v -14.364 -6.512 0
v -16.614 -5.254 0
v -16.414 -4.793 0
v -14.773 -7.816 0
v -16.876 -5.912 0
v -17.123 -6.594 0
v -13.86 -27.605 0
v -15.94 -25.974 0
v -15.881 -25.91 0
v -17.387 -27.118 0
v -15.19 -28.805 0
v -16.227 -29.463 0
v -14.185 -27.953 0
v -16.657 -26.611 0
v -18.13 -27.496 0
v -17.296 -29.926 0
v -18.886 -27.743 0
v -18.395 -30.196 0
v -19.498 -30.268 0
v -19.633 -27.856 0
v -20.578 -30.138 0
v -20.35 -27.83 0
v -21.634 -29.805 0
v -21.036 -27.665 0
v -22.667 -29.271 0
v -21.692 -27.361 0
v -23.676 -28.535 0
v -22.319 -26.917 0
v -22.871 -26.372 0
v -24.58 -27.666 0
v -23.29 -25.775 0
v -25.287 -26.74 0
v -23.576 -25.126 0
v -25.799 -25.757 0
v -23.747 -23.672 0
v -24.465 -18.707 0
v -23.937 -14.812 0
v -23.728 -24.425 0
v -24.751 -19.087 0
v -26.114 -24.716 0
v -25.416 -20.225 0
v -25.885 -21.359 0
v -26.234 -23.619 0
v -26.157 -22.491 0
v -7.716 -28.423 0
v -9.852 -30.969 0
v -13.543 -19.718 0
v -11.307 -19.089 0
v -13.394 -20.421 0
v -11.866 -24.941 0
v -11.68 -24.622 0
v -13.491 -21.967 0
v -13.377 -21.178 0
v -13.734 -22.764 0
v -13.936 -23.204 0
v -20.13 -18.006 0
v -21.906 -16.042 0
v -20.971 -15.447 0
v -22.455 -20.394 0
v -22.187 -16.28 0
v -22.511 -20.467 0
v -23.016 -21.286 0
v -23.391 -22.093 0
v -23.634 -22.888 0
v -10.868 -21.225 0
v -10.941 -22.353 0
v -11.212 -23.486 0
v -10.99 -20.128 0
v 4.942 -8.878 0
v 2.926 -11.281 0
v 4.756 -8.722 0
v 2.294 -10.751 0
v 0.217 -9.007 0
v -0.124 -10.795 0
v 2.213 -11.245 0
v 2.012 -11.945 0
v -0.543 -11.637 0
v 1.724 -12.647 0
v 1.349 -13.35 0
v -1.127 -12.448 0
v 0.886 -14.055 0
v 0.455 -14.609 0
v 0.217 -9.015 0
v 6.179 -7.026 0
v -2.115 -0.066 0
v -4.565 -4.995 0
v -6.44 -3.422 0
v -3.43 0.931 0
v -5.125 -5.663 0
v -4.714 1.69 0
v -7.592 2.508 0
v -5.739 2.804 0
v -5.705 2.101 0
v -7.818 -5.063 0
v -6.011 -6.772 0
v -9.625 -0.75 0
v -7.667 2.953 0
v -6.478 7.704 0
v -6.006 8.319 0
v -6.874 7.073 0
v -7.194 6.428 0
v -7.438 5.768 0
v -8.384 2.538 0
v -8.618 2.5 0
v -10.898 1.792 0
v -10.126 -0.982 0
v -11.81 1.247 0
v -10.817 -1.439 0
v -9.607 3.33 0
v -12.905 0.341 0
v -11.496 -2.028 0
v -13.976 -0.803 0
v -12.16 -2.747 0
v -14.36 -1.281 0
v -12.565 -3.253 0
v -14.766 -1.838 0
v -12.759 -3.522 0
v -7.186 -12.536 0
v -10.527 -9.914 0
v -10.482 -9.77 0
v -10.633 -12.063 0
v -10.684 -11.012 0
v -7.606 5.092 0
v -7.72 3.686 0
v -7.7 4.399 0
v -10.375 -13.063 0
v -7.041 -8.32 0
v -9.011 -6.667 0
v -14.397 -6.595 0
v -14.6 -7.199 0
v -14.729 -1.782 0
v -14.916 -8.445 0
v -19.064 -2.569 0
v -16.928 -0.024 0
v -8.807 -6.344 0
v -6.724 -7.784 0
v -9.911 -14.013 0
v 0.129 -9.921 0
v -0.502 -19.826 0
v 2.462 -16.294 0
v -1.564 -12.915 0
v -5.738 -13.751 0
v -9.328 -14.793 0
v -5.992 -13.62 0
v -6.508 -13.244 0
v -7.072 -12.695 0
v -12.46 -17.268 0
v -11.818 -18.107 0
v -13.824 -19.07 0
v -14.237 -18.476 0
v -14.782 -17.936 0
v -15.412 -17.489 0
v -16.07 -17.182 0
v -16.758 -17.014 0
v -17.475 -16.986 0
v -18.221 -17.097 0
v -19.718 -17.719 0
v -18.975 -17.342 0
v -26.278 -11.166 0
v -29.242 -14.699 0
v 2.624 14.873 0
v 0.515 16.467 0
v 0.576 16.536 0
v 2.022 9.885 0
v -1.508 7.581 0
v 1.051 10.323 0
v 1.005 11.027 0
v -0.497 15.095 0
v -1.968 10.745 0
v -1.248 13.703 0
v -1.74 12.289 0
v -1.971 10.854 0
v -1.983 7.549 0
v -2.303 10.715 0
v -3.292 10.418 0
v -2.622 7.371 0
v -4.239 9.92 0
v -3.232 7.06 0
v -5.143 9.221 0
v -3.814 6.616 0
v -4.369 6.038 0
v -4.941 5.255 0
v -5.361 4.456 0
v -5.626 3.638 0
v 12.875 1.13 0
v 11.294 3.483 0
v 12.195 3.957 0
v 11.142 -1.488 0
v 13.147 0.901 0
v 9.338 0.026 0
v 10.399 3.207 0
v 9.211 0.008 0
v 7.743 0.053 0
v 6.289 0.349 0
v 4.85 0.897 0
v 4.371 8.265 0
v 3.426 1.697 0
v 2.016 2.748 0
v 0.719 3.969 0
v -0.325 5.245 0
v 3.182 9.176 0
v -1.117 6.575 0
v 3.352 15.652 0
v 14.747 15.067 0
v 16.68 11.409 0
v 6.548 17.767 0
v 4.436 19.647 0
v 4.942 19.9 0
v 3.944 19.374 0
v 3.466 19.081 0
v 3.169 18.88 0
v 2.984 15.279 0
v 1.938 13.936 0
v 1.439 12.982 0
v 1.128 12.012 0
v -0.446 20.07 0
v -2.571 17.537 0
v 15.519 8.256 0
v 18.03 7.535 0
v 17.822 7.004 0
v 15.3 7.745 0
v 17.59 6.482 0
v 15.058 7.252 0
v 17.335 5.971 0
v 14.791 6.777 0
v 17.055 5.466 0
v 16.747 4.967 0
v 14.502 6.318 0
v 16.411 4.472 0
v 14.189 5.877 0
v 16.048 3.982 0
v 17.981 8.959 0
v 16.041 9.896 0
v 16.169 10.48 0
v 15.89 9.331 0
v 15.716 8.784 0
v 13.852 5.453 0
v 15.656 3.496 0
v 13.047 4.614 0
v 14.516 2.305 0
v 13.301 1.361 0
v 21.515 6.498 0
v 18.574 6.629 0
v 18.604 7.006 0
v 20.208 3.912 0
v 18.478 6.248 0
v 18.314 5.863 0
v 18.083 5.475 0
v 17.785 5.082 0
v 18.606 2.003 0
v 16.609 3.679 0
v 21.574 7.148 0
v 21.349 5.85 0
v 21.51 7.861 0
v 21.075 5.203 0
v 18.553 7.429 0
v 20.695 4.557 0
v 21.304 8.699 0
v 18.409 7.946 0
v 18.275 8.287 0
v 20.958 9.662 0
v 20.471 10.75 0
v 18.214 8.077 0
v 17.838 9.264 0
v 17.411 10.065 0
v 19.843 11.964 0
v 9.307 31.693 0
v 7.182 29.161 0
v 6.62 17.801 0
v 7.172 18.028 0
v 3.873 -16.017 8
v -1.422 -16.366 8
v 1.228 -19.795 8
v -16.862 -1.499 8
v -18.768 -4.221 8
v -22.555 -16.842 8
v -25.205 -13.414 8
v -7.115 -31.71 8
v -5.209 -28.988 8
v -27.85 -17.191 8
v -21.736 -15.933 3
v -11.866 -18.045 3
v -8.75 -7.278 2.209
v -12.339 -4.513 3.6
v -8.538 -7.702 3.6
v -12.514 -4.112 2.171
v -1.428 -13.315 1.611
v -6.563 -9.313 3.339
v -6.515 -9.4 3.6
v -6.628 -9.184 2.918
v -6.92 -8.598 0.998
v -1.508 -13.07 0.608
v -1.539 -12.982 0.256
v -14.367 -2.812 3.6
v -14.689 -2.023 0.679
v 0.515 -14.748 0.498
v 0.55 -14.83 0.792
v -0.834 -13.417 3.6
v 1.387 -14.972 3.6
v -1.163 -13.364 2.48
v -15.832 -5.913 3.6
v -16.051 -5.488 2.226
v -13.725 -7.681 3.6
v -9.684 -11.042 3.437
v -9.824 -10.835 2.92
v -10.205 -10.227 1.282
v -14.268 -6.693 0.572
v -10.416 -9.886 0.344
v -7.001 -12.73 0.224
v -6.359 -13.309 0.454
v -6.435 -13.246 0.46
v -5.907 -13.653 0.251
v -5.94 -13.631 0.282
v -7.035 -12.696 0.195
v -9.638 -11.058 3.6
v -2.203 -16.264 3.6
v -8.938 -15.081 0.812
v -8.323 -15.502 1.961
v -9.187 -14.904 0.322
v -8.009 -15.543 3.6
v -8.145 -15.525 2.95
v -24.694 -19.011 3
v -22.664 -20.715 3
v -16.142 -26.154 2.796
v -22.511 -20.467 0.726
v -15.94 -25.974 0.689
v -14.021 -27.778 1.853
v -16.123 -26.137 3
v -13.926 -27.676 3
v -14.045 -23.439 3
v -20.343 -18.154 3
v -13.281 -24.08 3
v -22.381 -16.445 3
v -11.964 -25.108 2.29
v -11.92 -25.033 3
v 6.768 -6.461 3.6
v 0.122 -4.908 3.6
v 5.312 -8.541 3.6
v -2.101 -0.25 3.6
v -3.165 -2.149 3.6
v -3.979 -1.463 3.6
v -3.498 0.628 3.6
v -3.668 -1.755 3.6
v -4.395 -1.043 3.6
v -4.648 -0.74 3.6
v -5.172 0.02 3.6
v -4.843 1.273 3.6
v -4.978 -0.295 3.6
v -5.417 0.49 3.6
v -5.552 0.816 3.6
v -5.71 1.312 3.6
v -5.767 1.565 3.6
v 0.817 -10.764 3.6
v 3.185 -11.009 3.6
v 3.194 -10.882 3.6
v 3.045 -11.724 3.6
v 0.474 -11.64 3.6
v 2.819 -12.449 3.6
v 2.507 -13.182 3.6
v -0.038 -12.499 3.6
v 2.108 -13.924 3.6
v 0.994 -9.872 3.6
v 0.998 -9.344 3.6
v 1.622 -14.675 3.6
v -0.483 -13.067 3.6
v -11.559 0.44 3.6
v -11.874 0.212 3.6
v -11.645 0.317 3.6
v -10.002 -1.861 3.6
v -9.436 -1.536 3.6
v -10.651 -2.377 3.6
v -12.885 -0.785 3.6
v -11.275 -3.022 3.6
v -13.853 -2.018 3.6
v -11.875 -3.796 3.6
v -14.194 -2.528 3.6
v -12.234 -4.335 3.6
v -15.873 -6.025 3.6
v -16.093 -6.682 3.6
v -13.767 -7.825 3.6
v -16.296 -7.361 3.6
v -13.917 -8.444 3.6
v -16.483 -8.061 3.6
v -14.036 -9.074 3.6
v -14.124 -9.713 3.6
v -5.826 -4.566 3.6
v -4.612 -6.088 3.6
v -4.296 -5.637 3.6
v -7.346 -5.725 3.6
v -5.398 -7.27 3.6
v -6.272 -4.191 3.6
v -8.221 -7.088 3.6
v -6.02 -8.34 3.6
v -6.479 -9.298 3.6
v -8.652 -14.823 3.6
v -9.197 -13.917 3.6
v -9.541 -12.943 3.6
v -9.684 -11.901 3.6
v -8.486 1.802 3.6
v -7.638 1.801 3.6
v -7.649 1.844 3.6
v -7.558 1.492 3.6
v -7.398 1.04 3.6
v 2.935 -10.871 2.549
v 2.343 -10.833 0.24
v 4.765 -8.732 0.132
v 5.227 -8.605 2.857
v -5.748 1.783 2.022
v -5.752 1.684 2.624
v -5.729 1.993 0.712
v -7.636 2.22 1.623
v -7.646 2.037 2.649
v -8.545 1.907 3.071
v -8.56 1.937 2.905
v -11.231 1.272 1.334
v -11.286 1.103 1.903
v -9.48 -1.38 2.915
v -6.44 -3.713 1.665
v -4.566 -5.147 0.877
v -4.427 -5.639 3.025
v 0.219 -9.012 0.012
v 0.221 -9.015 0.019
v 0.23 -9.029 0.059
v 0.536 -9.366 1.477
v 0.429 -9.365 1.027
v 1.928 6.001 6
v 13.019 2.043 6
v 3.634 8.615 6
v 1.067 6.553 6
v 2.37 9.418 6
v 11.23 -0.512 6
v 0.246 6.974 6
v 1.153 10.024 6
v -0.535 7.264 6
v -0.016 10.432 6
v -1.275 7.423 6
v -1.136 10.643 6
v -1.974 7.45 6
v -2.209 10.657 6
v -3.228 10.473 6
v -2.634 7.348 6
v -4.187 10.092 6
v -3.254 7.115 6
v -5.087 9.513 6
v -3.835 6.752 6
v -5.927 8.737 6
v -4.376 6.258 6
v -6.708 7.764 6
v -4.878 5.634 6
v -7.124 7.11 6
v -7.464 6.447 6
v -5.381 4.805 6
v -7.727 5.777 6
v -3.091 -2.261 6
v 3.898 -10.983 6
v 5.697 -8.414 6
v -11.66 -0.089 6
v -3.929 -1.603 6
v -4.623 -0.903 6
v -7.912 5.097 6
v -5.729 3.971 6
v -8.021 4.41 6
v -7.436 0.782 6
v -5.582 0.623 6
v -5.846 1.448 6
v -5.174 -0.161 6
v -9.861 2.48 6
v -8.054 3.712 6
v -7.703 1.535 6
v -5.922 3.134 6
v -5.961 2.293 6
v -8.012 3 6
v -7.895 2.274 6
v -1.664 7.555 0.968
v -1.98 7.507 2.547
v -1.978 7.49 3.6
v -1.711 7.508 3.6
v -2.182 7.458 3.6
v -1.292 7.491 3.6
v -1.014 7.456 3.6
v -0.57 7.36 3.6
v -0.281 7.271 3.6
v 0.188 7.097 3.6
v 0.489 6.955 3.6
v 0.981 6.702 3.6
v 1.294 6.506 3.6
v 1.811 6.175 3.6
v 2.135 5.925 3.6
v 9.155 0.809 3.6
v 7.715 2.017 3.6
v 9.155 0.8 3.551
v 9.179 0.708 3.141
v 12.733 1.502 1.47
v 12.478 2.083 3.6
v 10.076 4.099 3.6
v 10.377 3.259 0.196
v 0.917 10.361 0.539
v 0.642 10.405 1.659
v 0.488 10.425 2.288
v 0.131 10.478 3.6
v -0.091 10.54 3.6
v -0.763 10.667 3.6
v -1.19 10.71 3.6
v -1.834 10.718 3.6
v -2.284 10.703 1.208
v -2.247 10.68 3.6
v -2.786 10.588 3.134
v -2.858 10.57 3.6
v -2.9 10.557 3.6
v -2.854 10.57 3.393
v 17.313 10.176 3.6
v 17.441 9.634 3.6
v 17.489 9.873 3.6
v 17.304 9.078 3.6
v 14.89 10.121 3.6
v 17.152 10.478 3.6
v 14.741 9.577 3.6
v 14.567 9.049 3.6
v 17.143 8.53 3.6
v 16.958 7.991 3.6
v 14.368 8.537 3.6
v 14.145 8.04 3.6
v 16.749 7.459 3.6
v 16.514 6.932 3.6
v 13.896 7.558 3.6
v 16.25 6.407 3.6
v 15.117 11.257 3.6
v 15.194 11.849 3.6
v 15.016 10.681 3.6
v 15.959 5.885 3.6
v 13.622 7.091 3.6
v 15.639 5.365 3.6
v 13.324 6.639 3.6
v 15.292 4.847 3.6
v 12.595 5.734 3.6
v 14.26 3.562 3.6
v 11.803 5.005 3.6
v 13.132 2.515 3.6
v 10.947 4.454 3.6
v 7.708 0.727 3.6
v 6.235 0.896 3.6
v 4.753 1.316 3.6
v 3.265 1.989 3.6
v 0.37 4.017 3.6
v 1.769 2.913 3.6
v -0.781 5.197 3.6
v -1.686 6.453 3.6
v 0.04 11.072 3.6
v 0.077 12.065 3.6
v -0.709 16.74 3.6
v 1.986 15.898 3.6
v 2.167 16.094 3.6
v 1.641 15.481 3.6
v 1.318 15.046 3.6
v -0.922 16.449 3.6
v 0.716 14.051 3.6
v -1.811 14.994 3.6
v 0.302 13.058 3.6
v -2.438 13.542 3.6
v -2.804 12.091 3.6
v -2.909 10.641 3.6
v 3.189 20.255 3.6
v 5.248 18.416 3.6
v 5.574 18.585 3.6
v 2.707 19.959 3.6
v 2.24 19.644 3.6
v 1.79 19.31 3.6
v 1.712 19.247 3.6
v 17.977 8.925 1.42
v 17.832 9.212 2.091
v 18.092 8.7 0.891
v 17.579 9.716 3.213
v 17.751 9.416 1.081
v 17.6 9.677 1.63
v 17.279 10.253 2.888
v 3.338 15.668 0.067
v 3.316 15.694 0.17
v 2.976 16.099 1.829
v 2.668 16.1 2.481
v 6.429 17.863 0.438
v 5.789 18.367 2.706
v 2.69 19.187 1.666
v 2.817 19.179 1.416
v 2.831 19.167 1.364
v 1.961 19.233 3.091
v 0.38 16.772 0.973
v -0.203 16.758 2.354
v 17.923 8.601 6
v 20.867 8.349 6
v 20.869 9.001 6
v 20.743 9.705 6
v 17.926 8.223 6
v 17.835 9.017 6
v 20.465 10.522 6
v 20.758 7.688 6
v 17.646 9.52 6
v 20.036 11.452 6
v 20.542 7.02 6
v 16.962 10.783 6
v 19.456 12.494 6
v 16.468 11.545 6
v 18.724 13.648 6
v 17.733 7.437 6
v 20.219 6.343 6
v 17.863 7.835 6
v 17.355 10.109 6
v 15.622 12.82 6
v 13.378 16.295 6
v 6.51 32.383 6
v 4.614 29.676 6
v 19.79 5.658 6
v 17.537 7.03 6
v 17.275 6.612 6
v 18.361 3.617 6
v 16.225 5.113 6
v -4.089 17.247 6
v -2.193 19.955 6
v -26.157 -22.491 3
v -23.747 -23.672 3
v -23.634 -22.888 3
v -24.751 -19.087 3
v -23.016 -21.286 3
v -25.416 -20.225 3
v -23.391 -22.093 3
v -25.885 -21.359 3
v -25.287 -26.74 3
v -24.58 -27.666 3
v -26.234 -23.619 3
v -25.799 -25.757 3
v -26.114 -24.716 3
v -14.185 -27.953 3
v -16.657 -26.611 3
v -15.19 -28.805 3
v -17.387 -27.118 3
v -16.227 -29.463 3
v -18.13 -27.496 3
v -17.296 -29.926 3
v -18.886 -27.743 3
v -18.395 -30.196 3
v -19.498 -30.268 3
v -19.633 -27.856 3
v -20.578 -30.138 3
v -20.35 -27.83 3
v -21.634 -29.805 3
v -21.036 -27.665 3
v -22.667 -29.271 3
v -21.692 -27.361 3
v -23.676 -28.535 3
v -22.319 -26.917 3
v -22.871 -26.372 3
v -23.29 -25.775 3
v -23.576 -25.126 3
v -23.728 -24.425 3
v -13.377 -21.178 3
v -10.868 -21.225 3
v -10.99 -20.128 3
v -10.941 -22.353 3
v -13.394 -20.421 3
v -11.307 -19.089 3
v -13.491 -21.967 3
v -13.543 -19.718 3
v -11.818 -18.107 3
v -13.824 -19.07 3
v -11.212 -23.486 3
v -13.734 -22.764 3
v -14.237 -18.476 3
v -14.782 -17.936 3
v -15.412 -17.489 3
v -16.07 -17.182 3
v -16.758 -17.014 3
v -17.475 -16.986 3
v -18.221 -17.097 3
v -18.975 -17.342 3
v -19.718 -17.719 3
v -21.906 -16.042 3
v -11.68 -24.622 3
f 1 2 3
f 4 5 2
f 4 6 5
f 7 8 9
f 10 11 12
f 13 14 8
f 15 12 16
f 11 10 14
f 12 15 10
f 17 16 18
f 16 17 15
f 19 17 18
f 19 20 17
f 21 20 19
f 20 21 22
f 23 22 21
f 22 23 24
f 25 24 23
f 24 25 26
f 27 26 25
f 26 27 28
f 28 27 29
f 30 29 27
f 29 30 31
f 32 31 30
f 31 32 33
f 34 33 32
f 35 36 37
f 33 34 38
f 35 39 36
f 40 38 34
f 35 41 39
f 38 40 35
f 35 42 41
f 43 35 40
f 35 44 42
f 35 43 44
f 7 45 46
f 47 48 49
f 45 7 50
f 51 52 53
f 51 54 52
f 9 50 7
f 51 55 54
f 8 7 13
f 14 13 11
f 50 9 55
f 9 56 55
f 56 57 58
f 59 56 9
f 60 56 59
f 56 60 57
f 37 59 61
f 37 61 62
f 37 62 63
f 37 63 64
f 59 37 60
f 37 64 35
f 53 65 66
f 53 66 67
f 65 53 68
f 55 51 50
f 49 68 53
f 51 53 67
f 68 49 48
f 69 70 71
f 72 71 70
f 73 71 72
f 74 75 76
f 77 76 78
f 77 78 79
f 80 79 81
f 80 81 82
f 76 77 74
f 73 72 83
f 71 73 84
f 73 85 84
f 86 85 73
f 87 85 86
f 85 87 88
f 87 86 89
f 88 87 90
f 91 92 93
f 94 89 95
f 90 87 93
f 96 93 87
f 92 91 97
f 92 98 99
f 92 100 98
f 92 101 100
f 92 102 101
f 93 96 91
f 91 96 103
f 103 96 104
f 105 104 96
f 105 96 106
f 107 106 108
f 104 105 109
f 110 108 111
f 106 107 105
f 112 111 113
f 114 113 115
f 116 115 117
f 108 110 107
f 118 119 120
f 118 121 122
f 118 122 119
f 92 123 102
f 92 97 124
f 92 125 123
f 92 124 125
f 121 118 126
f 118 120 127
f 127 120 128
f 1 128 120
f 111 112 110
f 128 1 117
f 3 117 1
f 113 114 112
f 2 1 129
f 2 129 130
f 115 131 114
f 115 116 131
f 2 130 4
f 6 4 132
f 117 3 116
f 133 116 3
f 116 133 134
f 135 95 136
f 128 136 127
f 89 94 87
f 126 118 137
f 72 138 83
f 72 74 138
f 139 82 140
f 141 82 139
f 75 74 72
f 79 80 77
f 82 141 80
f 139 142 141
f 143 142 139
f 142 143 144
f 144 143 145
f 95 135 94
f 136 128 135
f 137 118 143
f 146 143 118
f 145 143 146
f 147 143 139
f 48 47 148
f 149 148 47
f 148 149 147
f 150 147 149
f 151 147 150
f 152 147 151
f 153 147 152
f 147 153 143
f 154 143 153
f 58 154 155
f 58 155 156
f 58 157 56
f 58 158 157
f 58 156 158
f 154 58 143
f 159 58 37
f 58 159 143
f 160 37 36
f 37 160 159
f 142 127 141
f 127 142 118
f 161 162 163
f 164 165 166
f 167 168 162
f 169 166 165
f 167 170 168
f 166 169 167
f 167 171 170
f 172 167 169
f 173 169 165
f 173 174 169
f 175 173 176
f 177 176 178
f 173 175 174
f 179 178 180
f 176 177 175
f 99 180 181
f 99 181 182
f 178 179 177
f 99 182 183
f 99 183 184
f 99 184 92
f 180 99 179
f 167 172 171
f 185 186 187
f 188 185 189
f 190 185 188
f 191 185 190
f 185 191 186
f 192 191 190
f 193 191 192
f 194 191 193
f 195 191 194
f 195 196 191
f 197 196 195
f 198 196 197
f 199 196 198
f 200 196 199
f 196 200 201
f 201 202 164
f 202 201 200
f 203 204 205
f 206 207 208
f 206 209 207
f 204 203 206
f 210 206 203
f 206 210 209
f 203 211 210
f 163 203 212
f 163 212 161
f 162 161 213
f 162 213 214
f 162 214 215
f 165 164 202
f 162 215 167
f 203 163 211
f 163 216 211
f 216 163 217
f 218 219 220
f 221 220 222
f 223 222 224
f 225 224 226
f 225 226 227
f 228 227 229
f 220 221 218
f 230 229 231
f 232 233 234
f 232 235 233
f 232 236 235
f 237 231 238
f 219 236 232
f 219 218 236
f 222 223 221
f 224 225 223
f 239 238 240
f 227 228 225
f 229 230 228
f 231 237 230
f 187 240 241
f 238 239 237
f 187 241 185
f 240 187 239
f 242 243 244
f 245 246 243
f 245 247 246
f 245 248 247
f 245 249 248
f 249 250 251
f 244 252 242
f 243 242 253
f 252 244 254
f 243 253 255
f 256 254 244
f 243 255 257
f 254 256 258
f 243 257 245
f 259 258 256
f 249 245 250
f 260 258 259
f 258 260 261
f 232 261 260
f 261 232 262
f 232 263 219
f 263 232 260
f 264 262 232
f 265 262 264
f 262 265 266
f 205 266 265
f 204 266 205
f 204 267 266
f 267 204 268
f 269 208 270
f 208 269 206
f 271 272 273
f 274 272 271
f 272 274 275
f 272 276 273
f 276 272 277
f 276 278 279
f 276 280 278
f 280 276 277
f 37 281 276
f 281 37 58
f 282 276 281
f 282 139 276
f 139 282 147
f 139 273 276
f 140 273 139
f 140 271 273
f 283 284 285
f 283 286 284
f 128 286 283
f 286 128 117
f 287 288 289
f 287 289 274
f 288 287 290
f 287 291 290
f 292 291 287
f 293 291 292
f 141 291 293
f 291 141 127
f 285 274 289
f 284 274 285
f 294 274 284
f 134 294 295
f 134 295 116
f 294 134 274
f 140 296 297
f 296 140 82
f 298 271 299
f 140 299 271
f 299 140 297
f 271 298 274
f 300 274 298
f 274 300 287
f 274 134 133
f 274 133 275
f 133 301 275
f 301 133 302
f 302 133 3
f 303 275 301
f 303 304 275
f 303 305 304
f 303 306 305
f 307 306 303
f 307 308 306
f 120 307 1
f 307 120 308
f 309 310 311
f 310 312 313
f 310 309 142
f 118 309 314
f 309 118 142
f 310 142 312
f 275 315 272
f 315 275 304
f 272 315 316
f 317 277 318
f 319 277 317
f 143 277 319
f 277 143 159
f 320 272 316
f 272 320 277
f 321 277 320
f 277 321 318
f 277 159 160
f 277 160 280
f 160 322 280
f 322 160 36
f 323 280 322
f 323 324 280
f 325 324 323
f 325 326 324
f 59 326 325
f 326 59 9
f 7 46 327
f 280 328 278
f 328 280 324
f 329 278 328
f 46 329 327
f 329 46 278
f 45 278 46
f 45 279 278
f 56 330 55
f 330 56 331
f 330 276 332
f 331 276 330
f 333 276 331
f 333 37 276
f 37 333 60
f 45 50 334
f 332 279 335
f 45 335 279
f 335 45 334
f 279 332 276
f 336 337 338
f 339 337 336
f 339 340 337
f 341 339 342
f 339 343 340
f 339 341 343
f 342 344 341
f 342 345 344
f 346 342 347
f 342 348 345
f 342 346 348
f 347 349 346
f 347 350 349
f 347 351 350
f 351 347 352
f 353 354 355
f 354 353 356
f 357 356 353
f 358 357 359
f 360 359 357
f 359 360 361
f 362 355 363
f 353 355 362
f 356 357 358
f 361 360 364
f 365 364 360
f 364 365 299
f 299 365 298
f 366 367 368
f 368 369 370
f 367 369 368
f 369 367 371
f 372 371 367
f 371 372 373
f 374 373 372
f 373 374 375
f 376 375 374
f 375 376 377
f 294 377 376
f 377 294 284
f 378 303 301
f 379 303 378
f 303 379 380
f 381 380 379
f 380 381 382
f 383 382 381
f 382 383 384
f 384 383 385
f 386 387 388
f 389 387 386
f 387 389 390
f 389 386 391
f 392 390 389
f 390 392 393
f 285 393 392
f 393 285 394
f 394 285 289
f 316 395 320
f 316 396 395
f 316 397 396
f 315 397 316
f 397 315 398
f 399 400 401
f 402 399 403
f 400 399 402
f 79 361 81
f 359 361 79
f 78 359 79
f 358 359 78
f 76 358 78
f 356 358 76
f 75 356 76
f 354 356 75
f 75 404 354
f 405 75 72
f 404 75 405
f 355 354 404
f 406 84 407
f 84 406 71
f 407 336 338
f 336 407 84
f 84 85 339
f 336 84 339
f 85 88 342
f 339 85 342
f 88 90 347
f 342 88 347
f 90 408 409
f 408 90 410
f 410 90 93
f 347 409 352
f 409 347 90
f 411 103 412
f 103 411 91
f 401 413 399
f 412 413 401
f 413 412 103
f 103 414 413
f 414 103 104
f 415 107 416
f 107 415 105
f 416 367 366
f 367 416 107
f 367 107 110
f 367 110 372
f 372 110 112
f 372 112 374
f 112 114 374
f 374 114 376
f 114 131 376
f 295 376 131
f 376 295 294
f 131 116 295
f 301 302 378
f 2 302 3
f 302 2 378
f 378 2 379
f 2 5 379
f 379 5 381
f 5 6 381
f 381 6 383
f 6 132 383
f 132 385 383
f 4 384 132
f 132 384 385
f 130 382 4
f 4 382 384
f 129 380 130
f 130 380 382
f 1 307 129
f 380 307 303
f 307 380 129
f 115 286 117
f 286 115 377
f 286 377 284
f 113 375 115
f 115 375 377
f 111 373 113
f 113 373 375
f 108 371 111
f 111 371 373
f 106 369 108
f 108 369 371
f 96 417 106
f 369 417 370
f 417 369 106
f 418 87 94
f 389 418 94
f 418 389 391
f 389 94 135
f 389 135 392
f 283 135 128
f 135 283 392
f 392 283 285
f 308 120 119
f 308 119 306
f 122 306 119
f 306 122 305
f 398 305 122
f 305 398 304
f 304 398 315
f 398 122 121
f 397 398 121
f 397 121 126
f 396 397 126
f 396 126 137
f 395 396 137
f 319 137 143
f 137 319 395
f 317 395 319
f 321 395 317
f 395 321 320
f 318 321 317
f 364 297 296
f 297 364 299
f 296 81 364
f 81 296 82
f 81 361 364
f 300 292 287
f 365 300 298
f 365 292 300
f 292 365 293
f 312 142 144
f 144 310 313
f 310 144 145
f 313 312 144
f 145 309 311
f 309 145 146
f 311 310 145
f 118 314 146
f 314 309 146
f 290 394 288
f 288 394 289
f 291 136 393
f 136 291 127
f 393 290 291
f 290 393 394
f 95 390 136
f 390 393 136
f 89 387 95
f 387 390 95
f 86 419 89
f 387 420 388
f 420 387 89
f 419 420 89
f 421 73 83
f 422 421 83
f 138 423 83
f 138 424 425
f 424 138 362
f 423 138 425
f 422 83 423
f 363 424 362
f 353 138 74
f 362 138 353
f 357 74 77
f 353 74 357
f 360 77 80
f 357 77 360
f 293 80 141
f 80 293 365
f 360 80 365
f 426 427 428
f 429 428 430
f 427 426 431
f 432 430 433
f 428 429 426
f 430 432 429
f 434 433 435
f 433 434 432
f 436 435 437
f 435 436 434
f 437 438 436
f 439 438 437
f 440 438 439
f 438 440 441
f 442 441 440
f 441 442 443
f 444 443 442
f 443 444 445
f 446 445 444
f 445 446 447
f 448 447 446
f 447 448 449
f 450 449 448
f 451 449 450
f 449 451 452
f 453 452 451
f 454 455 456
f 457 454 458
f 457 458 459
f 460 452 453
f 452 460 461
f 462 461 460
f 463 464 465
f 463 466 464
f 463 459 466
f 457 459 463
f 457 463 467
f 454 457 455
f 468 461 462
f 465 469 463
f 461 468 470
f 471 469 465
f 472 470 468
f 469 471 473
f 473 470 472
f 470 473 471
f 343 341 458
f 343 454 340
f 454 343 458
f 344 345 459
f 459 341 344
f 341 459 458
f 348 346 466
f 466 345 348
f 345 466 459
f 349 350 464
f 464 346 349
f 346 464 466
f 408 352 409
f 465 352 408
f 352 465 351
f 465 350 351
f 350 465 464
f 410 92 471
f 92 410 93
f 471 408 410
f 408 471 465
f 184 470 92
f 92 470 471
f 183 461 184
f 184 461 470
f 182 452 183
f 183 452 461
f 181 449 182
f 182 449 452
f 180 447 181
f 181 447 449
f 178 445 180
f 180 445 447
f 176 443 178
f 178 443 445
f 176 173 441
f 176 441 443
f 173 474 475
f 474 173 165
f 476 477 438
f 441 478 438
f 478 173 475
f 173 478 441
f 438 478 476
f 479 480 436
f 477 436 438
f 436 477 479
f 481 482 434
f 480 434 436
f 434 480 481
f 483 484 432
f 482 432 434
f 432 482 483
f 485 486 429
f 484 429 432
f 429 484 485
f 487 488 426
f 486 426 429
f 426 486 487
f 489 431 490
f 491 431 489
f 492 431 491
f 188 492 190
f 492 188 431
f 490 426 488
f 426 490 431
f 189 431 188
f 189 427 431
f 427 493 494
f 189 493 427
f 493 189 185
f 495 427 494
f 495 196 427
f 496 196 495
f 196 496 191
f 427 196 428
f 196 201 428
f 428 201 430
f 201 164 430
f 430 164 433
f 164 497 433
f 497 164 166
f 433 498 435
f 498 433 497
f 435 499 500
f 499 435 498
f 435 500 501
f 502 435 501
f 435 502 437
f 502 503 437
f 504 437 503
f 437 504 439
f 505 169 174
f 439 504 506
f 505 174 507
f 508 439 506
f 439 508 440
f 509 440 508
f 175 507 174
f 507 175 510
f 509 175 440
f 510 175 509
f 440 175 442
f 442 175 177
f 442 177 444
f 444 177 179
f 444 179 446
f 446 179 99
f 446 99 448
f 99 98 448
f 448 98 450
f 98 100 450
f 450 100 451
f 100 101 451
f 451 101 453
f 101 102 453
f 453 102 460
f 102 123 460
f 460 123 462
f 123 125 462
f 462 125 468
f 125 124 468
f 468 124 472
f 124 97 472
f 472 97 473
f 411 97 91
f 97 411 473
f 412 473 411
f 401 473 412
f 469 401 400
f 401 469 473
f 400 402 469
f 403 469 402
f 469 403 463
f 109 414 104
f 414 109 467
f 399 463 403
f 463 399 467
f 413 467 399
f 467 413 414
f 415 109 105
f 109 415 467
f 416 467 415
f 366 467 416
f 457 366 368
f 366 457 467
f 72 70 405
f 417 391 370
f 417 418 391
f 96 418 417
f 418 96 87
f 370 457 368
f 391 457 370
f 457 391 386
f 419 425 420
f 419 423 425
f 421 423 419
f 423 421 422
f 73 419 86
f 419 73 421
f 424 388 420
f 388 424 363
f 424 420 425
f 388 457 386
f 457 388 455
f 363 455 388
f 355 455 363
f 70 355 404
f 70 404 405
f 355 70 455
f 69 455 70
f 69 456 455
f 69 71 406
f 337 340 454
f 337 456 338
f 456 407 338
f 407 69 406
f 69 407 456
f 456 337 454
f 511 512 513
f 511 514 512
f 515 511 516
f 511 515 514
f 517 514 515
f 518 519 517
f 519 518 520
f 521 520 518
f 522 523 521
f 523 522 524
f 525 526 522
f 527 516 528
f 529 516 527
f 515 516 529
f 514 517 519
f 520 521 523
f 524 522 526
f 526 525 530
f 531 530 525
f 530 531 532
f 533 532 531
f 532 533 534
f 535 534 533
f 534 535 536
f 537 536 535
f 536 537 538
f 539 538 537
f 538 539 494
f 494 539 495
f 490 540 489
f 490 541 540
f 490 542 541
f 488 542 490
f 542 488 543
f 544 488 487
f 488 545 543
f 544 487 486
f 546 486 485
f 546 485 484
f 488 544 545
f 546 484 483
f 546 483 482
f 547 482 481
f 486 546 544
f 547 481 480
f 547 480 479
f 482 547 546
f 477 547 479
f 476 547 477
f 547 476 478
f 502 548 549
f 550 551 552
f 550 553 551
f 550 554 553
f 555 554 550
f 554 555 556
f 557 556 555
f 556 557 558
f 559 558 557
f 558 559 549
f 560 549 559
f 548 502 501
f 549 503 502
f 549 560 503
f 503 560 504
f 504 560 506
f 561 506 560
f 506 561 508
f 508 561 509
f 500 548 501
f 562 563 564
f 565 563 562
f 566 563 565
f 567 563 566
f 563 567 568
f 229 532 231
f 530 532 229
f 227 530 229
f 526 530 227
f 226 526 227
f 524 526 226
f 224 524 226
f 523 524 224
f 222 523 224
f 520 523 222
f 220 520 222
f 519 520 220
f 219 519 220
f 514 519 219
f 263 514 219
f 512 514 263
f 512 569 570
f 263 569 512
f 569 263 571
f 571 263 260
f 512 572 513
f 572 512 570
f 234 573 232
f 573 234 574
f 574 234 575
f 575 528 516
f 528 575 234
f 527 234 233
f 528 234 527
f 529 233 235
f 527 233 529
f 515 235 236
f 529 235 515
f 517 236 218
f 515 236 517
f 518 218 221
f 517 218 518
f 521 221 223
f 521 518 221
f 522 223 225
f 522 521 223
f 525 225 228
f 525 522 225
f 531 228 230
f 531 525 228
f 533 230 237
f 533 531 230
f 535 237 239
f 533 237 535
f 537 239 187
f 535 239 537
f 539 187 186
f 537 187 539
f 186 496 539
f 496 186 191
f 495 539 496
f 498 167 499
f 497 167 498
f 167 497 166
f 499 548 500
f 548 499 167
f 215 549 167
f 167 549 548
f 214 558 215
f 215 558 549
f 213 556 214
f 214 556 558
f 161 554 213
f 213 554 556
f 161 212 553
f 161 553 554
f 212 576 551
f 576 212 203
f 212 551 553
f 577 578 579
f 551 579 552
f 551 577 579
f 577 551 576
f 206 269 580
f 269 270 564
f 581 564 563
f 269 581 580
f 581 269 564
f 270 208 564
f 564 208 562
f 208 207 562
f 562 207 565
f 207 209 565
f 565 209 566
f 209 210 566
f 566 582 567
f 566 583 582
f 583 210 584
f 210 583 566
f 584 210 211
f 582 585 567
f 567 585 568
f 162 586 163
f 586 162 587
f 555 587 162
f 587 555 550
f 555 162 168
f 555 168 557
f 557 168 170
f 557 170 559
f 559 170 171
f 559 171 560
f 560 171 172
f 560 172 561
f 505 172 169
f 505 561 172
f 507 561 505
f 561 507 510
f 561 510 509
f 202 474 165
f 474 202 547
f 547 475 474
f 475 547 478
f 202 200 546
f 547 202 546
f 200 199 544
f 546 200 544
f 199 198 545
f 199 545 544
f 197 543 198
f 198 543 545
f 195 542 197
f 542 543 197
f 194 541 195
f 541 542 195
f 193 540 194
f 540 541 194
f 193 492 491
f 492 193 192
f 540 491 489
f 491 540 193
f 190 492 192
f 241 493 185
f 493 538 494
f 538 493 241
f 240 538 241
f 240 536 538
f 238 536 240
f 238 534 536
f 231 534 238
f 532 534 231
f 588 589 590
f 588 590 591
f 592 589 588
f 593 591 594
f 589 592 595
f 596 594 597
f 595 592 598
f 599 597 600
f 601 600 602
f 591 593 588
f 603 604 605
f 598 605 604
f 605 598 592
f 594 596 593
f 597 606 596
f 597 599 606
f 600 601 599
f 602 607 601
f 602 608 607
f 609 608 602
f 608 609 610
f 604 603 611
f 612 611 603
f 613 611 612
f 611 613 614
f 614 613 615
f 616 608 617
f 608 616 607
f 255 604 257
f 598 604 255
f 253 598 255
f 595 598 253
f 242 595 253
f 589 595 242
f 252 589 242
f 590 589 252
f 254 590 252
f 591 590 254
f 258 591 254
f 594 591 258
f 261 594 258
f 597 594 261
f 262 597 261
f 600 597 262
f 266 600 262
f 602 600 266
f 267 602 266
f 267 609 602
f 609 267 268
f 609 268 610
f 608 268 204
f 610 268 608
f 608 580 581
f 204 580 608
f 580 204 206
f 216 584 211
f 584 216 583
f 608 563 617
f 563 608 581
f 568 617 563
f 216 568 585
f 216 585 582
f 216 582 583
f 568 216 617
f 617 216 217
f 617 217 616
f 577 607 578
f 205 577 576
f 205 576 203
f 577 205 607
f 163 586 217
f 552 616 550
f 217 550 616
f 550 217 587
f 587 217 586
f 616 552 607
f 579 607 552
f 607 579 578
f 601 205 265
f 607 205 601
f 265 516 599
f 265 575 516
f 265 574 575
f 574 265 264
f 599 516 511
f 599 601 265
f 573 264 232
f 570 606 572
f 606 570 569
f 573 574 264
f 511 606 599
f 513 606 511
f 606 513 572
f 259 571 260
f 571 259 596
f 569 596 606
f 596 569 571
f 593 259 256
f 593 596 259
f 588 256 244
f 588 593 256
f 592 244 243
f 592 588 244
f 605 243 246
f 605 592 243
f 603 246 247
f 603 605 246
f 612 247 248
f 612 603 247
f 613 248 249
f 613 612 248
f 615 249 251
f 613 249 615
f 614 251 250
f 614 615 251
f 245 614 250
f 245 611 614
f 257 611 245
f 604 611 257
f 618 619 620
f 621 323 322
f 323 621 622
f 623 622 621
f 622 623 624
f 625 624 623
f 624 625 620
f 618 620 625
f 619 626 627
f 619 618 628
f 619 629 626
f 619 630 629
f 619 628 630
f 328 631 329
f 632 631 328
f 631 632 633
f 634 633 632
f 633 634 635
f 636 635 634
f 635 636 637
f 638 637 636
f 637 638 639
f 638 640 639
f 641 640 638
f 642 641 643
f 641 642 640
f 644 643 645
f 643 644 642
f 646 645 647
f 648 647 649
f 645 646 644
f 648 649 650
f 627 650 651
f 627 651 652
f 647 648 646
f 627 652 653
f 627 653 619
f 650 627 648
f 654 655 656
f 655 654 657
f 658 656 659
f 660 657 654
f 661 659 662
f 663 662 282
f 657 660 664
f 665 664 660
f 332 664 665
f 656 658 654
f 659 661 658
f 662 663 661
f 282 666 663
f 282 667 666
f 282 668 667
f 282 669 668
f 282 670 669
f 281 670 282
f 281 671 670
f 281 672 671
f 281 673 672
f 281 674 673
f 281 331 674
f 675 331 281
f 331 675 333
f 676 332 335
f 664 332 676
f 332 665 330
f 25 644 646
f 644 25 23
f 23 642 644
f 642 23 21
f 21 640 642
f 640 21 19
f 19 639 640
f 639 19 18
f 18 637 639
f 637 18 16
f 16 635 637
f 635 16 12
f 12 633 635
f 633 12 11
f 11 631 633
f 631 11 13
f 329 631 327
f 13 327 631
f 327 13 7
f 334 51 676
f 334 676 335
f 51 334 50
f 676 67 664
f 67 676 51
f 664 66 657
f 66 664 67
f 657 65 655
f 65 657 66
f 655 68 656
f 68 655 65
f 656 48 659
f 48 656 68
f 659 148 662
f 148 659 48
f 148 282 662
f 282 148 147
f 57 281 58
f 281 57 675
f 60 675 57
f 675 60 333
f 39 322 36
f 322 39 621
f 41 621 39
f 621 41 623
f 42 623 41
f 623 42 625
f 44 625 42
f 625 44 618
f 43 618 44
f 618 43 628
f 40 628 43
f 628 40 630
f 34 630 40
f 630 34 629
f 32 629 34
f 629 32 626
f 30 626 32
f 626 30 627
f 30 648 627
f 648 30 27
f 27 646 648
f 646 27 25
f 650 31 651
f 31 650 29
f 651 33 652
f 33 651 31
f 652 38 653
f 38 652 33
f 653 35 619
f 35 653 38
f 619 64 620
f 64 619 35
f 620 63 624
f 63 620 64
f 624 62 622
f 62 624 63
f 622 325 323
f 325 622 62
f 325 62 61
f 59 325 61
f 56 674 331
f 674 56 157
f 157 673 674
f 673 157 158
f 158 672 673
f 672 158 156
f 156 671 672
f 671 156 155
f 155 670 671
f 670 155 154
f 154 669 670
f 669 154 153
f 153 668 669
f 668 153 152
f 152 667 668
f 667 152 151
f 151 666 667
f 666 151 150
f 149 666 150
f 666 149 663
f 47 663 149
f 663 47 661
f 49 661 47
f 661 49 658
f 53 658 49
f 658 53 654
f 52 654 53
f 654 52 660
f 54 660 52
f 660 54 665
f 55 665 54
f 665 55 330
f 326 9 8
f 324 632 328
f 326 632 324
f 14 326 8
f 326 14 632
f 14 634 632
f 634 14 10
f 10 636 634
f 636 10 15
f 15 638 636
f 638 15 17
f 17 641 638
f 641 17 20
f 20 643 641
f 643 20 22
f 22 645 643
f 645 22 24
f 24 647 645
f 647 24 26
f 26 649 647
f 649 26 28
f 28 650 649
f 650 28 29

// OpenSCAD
Font_name = "Chewy";
Text = "Nancy";
Rotation = 50;
Connect_dots = true;
Dot_bridge_height_percent = 40;

function char_w(c) = 
    (c == "m" || c == "w") ? 15.0 :
    (c == "i" || c == "l" || c == "j" || c == "t" || c == "f") ? 7.5 :
    (c >= "A" && c <= "Z") ? 14.0 :
    10.5;

function get_step_at(text, i) = 
    (i <= 0) ? 0 :
    ((char_w(text[i-1]) + char_w(text[i])) / 2 * 0.95);

function get_char_x_auto(text, i) = 
    (i <= 0) ? 0 : (get_char_x_auto(text, i - 1) + get_step_at(text, i));

span = get_char_x_auto(Text, len(Text)-1);
cx = span / 2;
loop_x = -cx - 8.5;
loop_y = 0;
twist = -5;
$fn = 32;

rotate([0, 0, Rotation]) {
    union() {
        // Loop
        color("DimGray")
        linear_extrude(height = 3, $fn = $fn)
            translate([loop_x, loop_y, 0]) rotate([0, 0, -90])
                text(size = 20, text = "o", font = Font_name, halign = "center", valign = "center", $fn = $fn);

        // Letters
        for (i = [0 : len(Text) - 1]) {
            h = (i == 0) ? 8.0 : ((i % 2 == 0) ? 6.0 : 3.6);
            char = Text[i];
            char_x = get_char_x_auto(Text, i) - cx;

            color([0.92, 0.72, 0.1]) {
                // Main letter extrusion (full height h)
                linear_extrude(height = h, twist = twist, $fn = $fn)
                    translate([char_x, 0, 0])
                        text(size = 25, text = char, font = Font_name, halign = "center", valign = "center", $fn = $fn);

                // Recessed bridge at 40% height (retains strength, preserves top surface aesthetics)
                if (Connect_dots) {
                    bridge_factor = Dot_bridge_height_percent / 100;
                    bridge_h = h * bridge_factor;
                    bridge_twist = twist * bridge_factor;
                    if (char == "i") {
                        linear_extrude(height = bridge_h, twist = bridge_twist, $fn = $fn)
                            translate([char_x, 0, 0])
                                translate([-1.2, 6.5]) square([2.4, 4.0]);
                    }
                    if (char == "j") {
                        linear_extrude(height = bridge_h, twist = bridge_twist, $fn = $fn)
                            translate([char_x, 0, 0])
                                translate([-1.2, 11.0]) square([2.4, 4.0]);
                    }
                }
            }
        }
    }
}
